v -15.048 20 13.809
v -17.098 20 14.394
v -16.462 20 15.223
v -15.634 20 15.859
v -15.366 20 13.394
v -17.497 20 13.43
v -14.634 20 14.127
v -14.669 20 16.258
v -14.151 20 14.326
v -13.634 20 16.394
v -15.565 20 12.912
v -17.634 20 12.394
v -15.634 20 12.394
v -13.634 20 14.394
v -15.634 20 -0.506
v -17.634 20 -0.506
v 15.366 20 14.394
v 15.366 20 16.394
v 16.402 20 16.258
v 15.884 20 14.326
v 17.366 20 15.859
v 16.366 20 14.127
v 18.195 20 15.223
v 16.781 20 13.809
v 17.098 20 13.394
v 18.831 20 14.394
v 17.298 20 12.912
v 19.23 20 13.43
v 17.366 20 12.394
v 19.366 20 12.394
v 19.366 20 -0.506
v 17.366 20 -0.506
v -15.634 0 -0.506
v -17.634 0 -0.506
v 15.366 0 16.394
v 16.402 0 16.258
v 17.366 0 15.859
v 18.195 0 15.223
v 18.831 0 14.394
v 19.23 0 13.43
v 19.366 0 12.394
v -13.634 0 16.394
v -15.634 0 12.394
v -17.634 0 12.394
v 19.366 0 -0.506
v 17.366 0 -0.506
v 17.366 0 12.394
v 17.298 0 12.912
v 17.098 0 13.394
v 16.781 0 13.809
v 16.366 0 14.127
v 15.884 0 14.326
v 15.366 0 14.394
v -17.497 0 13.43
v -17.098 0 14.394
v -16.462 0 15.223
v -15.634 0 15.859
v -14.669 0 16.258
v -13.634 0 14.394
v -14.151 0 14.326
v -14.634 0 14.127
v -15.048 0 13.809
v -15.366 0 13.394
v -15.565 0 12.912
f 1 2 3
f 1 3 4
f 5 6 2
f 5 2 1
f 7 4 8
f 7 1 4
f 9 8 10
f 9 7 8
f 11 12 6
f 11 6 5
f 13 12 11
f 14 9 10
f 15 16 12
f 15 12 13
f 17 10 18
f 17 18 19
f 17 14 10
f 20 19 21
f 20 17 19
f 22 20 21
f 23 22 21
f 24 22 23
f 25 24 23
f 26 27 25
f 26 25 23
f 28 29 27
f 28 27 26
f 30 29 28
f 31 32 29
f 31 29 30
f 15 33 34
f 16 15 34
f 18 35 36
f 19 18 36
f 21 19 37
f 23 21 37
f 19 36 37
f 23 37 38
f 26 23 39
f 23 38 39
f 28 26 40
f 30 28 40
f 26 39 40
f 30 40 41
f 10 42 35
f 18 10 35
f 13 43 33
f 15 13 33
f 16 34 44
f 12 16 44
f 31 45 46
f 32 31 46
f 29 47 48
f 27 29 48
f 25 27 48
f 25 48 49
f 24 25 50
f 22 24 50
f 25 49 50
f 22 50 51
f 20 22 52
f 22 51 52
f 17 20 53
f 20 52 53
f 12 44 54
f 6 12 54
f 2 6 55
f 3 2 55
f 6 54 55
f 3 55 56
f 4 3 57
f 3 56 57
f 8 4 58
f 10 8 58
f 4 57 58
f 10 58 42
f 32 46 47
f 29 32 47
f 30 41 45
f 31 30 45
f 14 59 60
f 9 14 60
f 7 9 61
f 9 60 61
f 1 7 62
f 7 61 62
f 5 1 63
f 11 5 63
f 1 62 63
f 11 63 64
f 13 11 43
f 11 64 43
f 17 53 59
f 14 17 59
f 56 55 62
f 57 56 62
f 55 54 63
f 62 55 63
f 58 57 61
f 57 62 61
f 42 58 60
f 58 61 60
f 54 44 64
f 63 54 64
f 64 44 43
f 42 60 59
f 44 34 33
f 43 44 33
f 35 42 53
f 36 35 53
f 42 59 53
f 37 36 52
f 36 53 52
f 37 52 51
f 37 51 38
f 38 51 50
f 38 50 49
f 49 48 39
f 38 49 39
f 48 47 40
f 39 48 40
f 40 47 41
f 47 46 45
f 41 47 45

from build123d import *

# Parameters (mm, degrees)
BOSS_EXTRUDE2_DEPTH = 20


with BuildPart() as part:
    # Sketch1 → Boss-Extrude2 (new body)
    with BuildSketch(Plane(origin=(0, 0, 0), x_dir=(1, 0, 0), z_dir=(0, 1, 0))):
        with BuildLine():
            Line((1.36644496, -14.394460771), (-13.63355504, -14.394460771))
            ThreePointArc((-13.63355504, -14.394460771), (-15.047768603, -13.808674334), (-15.63355504, -12.394460771))
            Line((-15.63355504, -12.394460771), (-15.63355504, 0.505539229))
            Line((-15.63355504, 0.505539229), (-17.63355504, 0.505539229))
            Line((-17.63355504, 0.505539229), (-17.63355504, -12.394460771))
            ThreePointArc((-17.63355504, -12.394460771), (-16.461982165, -15.222887896), (-13.63355504, -16.394460771))
            Line((-13.63355504, -16.394460771), (1.36644496, -16.394460771))
            Line((1.36644496, -16.394460771), (15.36644496, -16.394460771))
            ThreePointArc((15.36644496, -16.394460771), (18.194872084, -15.222887896), (19.36644496, -12.394460771))
            Line((19.36644496, -12.394460771), (19.36644496, 0.505539229))
            Line((19.36644496, 0.505539229), (17.36644496, 0.505539229))
            Line((17.36644496, 0.505539229), (17.36644496, -12.394460771))
            ThreePointArc((17.36644496, -12.394460771), (16.780658522, -13.808674334), (15.36644496, -14.394460771))
            Line((15.36644496, -14.394460771), (1.36644496, -14.394460771))
        make_face()
    extrude(amount=BOSS_EXTRUDE2_DEPTH)


solid = part.part
